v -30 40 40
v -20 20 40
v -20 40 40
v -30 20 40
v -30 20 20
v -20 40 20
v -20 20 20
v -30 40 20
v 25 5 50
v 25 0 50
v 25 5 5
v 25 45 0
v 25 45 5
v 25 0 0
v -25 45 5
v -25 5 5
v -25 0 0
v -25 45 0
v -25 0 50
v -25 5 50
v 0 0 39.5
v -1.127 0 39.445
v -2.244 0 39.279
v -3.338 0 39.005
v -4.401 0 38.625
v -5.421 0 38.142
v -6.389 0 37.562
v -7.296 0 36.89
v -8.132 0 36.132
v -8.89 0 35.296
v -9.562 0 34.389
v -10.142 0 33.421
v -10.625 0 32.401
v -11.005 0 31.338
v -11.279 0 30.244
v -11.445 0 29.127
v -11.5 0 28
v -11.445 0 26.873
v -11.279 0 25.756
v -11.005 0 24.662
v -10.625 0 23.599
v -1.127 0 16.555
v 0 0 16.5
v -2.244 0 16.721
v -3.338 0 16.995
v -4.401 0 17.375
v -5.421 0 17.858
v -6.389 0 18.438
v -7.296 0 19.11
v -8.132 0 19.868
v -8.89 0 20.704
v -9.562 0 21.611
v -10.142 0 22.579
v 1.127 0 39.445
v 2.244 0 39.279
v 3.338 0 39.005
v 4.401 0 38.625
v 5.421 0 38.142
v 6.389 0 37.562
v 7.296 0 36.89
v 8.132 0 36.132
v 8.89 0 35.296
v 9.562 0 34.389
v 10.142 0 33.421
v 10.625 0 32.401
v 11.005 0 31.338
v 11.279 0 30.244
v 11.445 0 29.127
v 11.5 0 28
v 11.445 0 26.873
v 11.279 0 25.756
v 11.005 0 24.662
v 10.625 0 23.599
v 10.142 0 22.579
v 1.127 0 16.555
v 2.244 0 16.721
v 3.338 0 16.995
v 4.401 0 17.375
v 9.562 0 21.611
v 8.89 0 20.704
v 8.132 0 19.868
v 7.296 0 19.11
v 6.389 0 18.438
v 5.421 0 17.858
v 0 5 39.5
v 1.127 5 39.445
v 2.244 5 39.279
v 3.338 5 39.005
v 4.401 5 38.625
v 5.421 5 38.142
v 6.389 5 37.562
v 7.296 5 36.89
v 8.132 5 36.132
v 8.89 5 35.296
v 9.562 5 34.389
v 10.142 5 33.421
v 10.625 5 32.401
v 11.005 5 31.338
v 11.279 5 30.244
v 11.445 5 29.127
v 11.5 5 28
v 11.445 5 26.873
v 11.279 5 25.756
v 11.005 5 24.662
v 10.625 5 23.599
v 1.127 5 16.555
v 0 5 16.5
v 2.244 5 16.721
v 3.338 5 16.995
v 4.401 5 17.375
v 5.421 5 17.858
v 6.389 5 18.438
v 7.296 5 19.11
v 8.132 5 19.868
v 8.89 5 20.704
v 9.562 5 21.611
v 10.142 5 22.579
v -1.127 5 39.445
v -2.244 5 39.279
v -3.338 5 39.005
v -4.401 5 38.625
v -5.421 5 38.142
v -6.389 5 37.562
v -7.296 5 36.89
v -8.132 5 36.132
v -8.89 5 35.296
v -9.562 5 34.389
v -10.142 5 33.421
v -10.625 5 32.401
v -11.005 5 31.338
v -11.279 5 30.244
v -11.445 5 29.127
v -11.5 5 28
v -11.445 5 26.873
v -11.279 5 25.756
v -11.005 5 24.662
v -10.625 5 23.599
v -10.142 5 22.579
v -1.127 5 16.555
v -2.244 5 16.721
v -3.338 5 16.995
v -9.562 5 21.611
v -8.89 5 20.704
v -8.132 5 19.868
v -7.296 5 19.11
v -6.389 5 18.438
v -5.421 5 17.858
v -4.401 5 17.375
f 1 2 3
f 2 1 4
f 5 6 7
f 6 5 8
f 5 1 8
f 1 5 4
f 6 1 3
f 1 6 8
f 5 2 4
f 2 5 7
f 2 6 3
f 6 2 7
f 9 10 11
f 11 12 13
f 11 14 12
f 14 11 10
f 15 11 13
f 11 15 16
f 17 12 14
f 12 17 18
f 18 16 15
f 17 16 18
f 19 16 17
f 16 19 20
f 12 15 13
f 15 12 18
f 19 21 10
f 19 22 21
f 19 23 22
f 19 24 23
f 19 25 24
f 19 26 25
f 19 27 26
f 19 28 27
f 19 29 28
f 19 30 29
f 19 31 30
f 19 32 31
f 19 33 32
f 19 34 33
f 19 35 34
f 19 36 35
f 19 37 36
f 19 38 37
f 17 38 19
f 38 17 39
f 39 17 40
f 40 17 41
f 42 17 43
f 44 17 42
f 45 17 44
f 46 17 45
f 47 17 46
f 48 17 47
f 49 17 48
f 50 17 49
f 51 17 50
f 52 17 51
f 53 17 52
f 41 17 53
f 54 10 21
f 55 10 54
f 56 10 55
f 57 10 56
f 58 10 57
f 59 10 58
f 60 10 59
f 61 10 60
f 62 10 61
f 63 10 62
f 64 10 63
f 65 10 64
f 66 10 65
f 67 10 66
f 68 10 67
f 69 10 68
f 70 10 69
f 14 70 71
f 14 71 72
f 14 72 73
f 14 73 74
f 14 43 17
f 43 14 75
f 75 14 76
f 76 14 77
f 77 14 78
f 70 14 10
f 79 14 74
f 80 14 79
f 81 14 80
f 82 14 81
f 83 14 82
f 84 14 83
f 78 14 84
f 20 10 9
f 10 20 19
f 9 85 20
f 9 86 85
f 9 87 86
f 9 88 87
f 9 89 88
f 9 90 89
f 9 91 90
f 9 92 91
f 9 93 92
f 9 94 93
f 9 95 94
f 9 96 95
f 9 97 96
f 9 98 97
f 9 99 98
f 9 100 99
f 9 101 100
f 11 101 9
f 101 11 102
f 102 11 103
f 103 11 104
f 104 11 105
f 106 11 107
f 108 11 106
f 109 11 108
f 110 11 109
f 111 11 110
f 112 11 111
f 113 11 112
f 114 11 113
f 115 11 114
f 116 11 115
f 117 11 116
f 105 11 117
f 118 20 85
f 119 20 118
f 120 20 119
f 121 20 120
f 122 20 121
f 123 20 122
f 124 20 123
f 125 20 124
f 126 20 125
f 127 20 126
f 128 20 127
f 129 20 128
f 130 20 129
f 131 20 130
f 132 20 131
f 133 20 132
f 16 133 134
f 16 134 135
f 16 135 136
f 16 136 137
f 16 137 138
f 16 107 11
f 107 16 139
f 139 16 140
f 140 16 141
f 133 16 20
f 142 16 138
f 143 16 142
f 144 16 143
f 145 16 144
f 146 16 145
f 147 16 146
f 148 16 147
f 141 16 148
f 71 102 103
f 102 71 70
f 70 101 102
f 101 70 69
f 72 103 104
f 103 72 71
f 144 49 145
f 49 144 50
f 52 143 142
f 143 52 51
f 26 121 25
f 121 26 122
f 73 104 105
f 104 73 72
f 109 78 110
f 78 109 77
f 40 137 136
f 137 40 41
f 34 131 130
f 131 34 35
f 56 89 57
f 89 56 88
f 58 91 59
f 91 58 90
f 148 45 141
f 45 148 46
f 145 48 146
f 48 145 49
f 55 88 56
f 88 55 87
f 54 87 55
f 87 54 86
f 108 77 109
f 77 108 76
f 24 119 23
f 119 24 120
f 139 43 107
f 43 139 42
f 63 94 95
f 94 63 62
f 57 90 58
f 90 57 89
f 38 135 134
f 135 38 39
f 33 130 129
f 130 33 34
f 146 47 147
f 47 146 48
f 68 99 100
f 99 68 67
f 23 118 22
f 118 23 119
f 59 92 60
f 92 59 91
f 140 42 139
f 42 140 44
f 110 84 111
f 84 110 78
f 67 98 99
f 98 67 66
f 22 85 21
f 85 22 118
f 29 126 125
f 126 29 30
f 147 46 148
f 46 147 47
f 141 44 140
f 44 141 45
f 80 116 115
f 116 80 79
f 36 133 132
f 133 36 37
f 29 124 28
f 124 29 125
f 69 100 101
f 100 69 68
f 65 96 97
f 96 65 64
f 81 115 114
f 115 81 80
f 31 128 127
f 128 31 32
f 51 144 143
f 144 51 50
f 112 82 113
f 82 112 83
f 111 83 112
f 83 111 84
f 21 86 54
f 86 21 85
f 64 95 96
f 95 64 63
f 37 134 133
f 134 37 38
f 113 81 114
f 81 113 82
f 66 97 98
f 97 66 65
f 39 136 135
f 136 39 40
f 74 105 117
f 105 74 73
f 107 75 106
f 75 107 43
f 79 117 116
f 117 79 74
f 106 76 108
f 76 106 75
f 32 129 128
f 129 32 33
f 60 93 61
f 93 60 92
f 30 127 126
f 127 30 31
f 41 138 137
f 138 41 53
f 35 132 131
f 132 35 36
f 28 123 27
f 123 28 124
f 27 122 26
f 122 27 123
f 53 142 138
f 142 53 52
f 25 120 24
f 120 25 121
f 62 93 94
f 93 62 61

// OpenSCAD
// L-shaped mounting bracket for NEMA 17 stepper motor (syringe pump)
// Print orientation: base plate flat on bed, motor plate building up in +Z

$fn = 64;

// ---- Base plate ----
base_x0 = -25;      // base plate X start
base_x1 = 25;       // base plate X end
base_y0 = 0;        // base plate Y start
base_y1 = 45;       // base plate Y end
base_t  = 5;        // base plate thickness (Z)

// ---- Motor plate ----
motor_x0 = -25;     // motor plate X start
motor_x1 = 25;      // motor plate X end
motor_y0 = 0;       // motor plate Y start
motor_y1 = 5;       // motor plate Y end
motor_h  = 50;      // motor plate height (Z)

// ---- Boss hole (motor centring boss) ----
boss_d     = 23;    // boss hole diameter
boss_x     = 0;     // boss hole centre X
boss_z     = 28;    // boss hole centre Z
boss_h     = motor_y1 - motor_y0 + 2;  // hole height along Y (overruns faces)

// ---- Screw holes (M3, on square pattern) ----
screw_d    = 3.4;   // screw hole diameter
screw_n    = 4;     // number of screw holes
screw_a    = 31;    // square pattern size (centre to centre)
screw_z    = motor_h - 5;  // screw holes near top face

// ---- Gussets ----
gusset_t   = 5;     // gusset thickness (X)
gusset_leg = 20;    // right triangle leg lengths (Y and Z)
gusset_x0  = motor_x0 - 5;  // left gusset X start
gusset_x1  = motor_x0;      // left gusset X end / right gusset X start
gusset_x2  = motor_x1;      // right gusset X end
fuse       = 0.01;                // small overlap so gussets fuse into plates

// ---- Cutting overshoot ----
eps = 0.5;          // extension past cut faces

difference() {
    union() {
        // Base plate
        translate([base_x0, base_y0, 0])
            cube([base_x1 - base_x0, base_y1 - base_y0, base_t]);

        // Motor plate
        translate([motor_x0, motor_y0, 0])
            cube([motor_x1 - motor_x0, motor_y1 - motor_y0, motor_h]);

        // Gussets: right triangle in YZ, legs along +Y and +Z
        for (sx = [-1, 1])
            translate([sx > 0 ? gusset_x1 : gusset_x0,
                       gusset_leg,
                       gusset_leg])
                cube([gusset_t, gusset_leg, gusset_leg]);
    }

    // Boss hole
    translate([boss_x, -eps, boss_z])
        rotate([-90, 0, 0])
            cylinder(d = boss_d, h = boss_h);

    // Screw holes
    for (i = [0 : screw_n - 1]) {
        x = (i % 2 - 0.5) * 2 * screw_a;
        y = floor(i / 2 - 0.5) * 2 * screw_a;
        translate([x, y, boss_z - screw_z])
            cylinder(d = screw_d, h = screw_z + eps);
    }
}
